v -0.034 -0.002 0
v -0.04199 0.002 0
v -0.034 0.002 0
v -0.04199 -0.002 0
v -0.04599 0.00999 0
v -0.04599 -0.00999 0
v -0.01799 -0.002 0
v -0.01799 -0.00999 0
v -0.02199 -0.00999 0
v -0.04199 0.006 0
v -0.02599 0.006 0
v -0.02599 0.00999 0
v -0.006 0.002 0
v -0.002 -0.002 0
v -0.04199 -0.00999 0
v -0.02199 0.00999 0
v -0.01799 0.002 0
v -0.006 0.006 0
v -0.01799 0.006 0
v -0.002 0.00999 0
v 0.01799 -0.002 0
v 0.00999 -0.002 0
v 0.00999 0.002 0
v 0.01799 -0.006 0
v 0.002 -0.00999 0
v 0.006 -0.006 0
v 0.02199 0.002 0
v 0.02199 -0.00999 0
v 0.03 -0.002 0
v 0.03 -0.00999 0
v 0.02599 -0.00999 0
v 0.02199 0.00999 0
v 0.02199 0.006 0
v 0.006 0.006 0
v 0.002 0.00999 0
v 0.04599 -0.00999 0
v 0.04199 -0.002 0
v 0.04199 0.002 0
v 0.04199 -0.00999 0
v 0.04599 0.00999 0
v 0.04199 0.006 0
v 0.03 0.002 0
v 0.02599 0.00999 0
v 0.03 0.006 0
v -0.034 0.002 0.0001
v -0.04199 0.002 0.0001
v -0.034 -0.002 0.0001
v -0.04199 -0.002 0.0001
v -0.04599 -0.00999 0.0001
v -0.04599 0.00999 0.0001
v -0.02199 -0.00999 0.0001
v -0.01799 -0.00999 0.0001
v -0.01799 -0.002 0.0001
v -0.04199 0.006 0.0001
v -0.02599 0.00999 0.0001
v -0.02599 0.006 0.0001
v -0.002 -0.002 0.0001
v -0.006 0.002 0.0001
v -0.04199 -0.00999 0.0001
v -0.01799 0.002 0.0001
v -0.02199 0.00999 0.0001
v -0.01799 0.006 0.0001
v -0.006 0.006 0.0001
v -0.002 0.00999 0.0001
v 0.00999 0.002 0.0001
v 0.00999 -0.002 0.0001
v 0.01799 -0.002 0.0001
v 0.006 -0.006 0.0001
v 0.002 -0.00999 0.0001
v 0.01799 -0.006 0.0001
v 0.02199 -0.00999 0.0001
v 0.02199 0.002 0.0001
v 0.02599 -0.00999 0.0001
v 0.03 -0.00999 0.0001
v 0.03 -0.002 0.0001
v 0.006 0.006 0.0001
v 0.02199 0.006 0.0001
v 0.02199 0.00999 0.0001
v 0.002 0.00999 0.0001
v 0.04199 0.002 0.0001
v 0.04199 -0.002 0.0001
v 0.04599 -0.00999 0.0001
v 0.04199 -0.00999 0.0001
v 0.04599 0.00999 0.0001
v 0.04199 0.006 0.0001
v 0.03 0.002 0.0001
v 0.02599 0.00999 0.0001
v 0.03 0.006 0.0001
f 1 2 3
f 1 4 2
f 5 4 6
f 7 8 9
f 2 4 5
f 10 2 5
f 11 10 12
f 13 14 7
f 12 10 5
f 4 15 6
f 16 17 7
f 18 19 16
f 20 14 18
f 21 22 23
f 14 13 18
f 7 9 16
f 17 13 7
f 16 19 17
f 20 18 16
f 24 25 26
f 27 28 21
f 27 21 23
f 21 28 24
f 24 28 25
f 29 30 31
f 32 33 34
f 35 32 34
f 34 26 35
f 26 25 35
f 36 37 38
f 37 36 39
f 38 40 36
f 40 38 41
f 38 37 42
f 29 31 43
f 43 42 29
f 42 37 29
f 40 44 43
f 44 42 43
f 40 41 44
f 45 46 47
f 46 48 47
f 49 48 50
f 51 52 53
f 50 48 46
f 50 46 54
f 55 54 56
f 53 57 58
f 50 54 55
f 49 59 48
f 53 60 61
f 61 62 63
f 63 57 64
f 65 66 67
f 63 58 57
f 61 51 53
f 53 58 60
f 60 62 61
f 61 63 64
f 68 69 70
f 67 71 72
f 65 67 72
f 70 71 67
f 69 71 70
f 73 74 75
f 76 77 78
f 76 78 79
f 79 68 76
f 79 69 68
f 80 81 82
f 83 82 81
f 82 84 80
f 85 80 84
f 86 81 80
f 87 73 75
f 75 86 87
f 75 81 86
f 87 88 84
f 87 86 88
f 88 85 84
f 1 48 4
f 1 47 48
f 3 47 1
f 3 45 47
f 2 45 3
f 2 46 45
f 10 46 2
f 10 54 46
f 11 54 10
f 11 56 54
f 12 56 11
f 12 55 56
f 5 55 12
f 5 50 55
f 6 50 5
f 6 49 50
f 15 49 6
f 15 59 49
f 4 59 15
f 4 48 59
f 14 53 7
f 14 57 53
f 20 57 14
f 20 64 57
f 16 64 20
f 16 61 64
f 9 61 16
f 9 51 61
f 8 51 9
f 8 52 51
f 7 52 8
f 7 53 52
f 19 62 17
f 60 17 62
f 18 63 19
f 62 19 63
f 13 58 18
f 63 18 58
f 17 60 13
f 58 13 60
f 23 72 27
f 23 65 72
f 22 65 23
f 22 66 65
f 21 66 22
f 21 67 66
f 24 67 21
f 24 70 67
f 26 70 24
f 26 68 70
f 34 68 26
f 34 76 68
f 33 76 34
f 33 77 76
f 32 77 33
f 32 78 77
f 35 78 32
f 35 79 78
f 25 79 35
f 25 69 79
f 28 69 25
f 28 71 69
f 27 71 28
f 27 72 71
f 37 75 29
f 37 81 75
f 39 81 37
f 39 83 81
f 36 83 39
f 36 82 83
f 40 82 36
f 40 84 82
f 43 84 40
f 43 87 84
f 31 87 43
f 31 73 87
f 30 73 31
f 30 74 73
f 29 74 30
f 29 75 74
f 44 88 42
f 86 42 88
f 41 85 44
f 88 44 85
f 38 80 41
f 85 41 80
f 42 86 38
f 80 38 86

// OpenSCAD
// file: Text_shared.scad
char_depth = 0.0001;

char_pixelsz = 0.02/5;
char_pheight = 5;
char_max_pwidth = 5;

function sum(list) = list * [for (_=list) 1];
function partialsum(list, end) = list * [for (i=[0:len(list)-1]) i < end ? 1 : 0];

module _Text_Line(a, b) {
  l = norm(b-a);
  f = l > 0 ? (b-a)/l : [1, 0];
  r = [f.y, -f.x];
  ea = -0.5*f;
  eb = (l+0.5)*f;
  sr = 0.5*r;
  sl = -sr;
  polygon([
    a+ea+sr,
    a+eb+sr,
    a+eb+sl,
    a+ea+sl,
  ]*char_pixelsz);
}

module _Text_Segments(pts, off=[0,0]) {
  for (i=[0:len(pts)-2]) {
    pa = pts[i];
    pb = pts[i+1];
    if (len(pa) == 2 && len(pb) == 2)
      _Text_Line(pts[i]+off, pts[i+1]+off);
  }
}

_Letters = [
  [[-2, -2], [-2, 2], [2, 2], [2, -2], [2, 0], [-2, 0]], // A
  [], // B
  [[2, -2], [-2, -2], [-2, 2], [2, 2]], // C
  [[2, 0.5], [2, -2], [-2, -2], [-2, 2], [0.5, 2], [], [3, 0], [0, 3]], // D
  [[2, -2], [-2, -2], [-2, 2], [2, 2], [], [-2, 0], [0, 0]], // E
  [[2, 2], [-2, 2], [-2, -2], [-2, 0], [0, 0]], // F
  [[0, 0], [2, 0], [2, -2], [-2, -2], [-2, 2], [2, 2]], // G
  [], // H
  [[0, -2], [0, 2]], // I
  [], // J
  [], // K
  [[-2, 2], [-2, -2], [2, -2]], // L
  [], // M
  [], // N
  [[-2, -2], [-2, 2], [2, 2], [2, -2], [-2, -2]], // O
  [[-2, -2], [-2, 2], [2, 2], [2, 0], [-2, 0]], // P
  [], // Q
  [[-2, -2], [-2, 2], [2, 2], [2, 0], [-2, 0], [1, -3]], // R
  [], // S
  [], // T
  [], // U
  [], // V
  [], // W
  [], // X
  [], // Y
  [], // Z
  [[-2, 2], [2, 2], [2, 0], [0, 0], [], [0, -2], [0, -2]], // ? for missing
];

function _Letter_Lookup(c) =
  let(
    ci=ord(c),
    li=ci-ord("A"),
    issp=ci==32,
    lps=li>=0&&li<26 ? _Letters[li] : [],
    lpf=len(lps)==0 ? _Letters[26] : lps
  ) issp ? [] : lpf;

function _Letter_Bounds(letter) =
  let(
    fletter = concat([[0, 0]], [for (l=letter) len(l)==2 ? l : [0,0]]),
    xs = [for (l=fletter) l.x],
    ys = [for (l=fletter) l.y]
  ) [min(xs), min(ys), max(xs), max(ys)];

module Text(letters) {
  lbounds = [for (l=letters) _Letter_Bounds(l)];
  lwidths = [for (b=lbounds) min(b.z-b.x+1, char_max_pwidth)];
  lmins = [for (b=lbounds) b.x];
  twid = sum(lwidths) + len(letters)-1;
  startoff = (1-twid)/2;
  offs = [for (i=[0:len(letters)-1]) startoff+i+partialsum(lwidths, i)];
  linear_extrude(height=char_depth) {
    for (i=[0:len(letters)-1]) if (len(letters[i]) > 0) {
      letter = letters[i];
      off = offs[i];
      left = off-lmins[i];
      wid = lwidths[i];
      intersection() {
        _Text_Segments(letter, [left, 0]);
        scale([char_pixelsz,char_pixelsz]) translate([off-0.5, -char_pheight/2])
          square(size=[wid, char_pheight]);
      }
    }
  }
}

module Text(text) {
  letters = [for (c=text) _Letter_Lookup(c)];
  lbounds = [for (l=letters) _Letter_Bounds(l)];
  lwidths = [for (b=lbounds) min(b.z-b.x+1, char_max_pwidth)];
  lmins = [for (b=lbounds) b.x];
  twid = sum(lwidths) + len(letters)-1;
  startoff = (1-twid)/2;
  offs = [for (i=[0:len(letters)-1]) startoff+i+partialsum(lwidths, i)];
  linear_extrude(height=char_depth) {
    for (i=[0:len(letters)-1]) if (len(letters[i]) > 0) {
      letter = letters[i];
      off = offs[i];
      left = off-lmins[i];
      wid = lwidths[i];
      intersection() {
        _Text_Segments(letter, [left, 0]);
        scale([char_pixelsz,char_pixelsz]) translate([off-0.5, -char_pheight/2])
          square(size=[wid, char_pheight]);
      }
    }
  }
}
// main file
include <Text_shared.scad>;

module Text_FPGA() {
  Text("FPGA");
}

Text_FPGA();
